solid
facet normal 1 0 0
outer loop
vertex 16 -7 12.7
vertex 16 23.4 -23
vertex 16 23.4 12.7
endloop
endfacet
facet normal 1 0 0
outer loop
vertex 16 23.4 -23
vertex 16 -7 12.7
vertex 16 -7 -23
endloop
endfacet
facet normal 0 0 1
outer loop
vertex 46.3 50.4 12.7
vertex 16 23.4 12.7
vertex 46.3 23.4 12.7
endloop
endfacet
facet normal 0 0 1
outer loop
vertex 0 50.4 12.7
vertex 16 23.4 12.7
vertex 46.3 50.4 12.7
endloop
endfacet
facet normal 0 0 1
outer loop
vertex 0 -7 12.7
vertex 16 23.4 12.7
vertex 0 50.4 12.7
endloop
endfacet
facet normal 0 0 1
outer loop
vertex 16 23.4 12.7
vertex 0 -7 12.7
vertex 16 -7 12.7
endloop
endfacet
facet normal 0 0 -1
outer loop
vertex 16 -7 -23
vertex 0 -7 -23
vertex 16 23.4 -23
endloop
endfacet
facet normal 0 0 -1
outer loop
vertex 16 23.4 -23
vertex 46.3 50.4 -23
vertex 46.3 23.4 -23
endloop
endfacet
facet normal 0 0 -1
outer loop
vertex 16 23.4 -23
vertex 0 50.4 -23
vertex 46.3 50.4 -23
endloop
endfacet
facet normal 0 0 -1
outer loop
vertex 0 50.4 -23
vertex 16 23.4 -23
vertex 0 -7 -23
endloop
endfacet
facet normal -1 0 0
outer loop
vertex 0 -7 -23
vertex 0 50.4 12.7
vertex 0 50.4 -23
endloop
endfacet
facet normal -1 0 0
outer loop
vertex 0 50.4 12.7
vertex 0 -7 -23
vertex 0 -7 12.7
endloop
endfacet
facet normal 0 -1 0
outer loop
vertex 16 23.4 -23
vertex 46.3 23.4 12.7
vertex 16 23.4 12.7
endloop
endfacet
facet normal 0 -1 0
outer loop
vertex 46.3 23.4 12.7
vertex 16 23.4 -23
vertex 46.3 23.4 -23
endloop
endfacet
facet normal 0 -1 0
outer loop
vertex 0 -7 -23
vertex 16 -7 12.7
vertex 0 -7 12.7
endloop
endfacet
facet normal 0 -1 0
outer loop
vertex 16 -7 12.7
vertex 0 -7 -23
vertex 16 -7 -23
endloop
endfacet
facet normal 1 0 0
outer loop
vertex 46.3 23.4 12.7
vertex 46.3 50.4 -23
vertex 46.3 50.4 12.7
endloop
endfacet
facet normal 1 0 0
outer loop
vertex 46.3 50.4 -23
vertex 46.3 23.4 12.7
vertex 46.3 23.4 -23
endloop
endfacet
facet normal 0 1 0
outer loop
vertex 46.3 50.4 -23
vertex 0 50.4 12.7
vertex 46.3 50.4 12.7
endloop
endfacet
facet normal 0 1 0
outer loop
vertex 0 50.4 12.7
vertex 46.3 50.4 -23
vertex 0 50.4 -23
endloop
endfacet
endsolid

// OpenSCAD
/// --- RENDER SELECTION

//air_thingy();
air_thingy_support();
//top_plate();
render_printer_connectorplate = 0;

/// --- CALIBRATION VARIABLES

heatbrake_width = 45.8 + 0.5;
heatbrake_height = 12.9 + 0.2;
heatbrake_depth = 15.8 + 0.2;
heatbrake_sunk_at_mount = 3;

fan_width = 40 + 0.2;
fan_screw_distance = 32.3;
fan_screw_diameter = 2.9;
fan_distance_from_center = 7;
fan_screw_length = 5;
fan_lip_height = 5;

board_width = 45.1;
board_height = 33;
board_solder_offset = 2.5;
board_thickness = 1.7;
board_depth = 20-board_thickness;

printhead_height = 45.1;

clampscrew_distance_from_heatbrake_end = 44.8;
clampscrew_diameter = 3 + 0.5 ;
clampscrew_distance_between = 10.5;

air_channel_width = 7;
air_channel_from_heatbrake_end = 16.4;

front_space = 20;

wall_thickness = 1.6;

nozzle_below_heatbrake = 25;
nozzle_distance_from_heatbrake_end = 61.5;
nozzle_diameter = 7;
nozzle_distance_from_heatbrake_back = 9.5;

exhaust_bed_clearance = 2;
exhaust_nozzle_clearance = 20;
exhaust_width = 5;

filament_diameter = 3.5 + 0.2;
filament_tube_diameter = 9 + 0.2;
filament_tube_guide_height = 6.5;

stepper_motor_depth = 34;
stepper_motor_width = 42.5;
stepper_motor_connector_depth = 10.3 + 0.5;
stepper_motor_connector_width = 16.3 + 0.5;

top_plate_height = 5;

/// --- CALCULATED

fan_screw_distance_from_wall = (fan_width - fan_screw_distance)/2;
fan_screw_block_size = fan_screw_diameter+fan_screw_distance_from_wall;

module top_plate() {
    difference() {
        union() {
            translate([heatbrake_width-fan_distance_from_center+wall_thickness,-wall_thickness,printhead_height])
            cube([stepper_motor_width+fan_distance_from_center-wall_thickness,heatbrake_depth+(fan_width-front_space-heatbrake_depth)+wall_thickness*3,top_plate_height]);
            
            translate([heatbrake_width-(board_width+wall_thickness*2),heatbrake_depth+(fan_width-front_space-heatbrake_depth)+wall_thickness*2,printhead_height])
            cube([stepper_motor_width+heatbrake_width+wall_thickness,stepper_motor_depth-(fan_width-heatbrake_depth-front_space+wall_thickness*2)-(board_thickness+wall_thickness*2+5),top_plate_height]);
            
            translate([heatbrake_width,heatbrake_depth,printhead_height])
            cube([stepper_motor_width,stepper_motor_depth,top_plate_height]);
            
            translate([nozzle_distance_from_heatbrake_end,heatbrake_depth-nozzle_distance_from_heatbrake_back,printhead_height+top_plate_height])
            cylinder(d=filament_tube_diameter+wall_thickness*2,h=filament_tube_guide_height,$fn=100);
        }
        
        //filament cutout
        translate([nozzle_distance_from_heatbrake_end,heatbrake_depth-nozzle_distance_from_heatbrake_back,printhead_height])
        cylinder(d=filament_diameter,h=filament_tube_guide_height+top_plate_height,$fn=100);
        
        //tube connector cutout
        translate([nozzle_distance_from_heatbrake_end,heatbrake_depth-nozzle_distance_from_heatbrake_back,printhead_height+top_plate_height])
        cylinder(d=filament_tube_diameter,h=filament_tube_guide_height,$fn=100);
        
        //board cutout
        translate([heatbrake_width-(board_width+wall_thickness)+1,heatbrake_depth+stepper_motor_depth-board_depth-wall_thickness-board_solder_offset,printhead_height-board_height/2])
        cube([board_width-2,board_depth-board_thickness,board_height]);
        
        //stepper connector cutout
        translate([heatbrake_width+((stepper_motor_width-stepper_motor_connector_width)/2),heatbrake_depth+stepper_motor_depth-stepper_motor_connector_depth,stepper_motor_width])
        cube([stepper_motor_connector_width,stepper_motor_connector_depth,10]);
        
        //clamp screw holes
        translate([clampscrew_distance_from_heatbrake_end,(heatbrake_depth-clampscrew_distance_between)/2,heatbrake_height])
        cylinder(d=clampscrew_diameter,h=printhead_height,$fn=100);
        translate([clampscrew_distance_from_heatbrake_end,(heatbrake_depth-clampscrew_distance_between)/2+clampscrew_distance_between,heatbrake_height])
        cylinder(d=clampscrew_diameter,h=printhead_height,$fn=100);
    }
}

module air_thingy_support()
{
    union() {
    translate([0,-air_channel_width,-nozzle_below_heatbrake+exhaust_bed_clearance])
    cube([air_channel_from_heatbrake_end-0.4, air_channel_width*2+heatbrake_depth+0.4, heatbrake_height - 0.4 +nozzle_below_heatbrake-exhaust_bed_clearance]);
    
    translate([0,heatbrake_depth+air_channel_width+0.4,-nozzle_below_heatbrake+exhaust_bed_clearance])
    cube([heatbrake_width, stepper_motor_depth-air_channel_width, heatbrake_height - 0.4 +nozzle_below_heatbrake-exhaust_bed_clearance]);
    }
}

module air_thingy() {
    difference() {
        union() {
            //fan lip
            translate([(heatbrake_width-fan_width-wall_thickness-fan_distance_from_center),-front_space,printhead_height+fan_screw_length])
            cube([fan_width+wall_thickness*2,fan_width+wall_thickness*2,fan_lip_height]);
            
            translate([(heatbrake_width-fan_width-wall_thickness-fan_distance_from_center),-front_space,printhead_height])
            cube([fan_width+wall_thickness*2,fan_width+wall_thickness*2,fan_screw_length]);
            
            
            //outer hull fan mount + screw block
            hull() {
                translate([(heatbrake_width-fan_width-wall_thickness-fan_distance_from_center),-front_space,printhead_height])
                cube([fan_width+wall_thickness*2,fan_width+wall_thickness*2,0.01]);
                
                translate([0,-air_channel_width,heatbrake_height])
                cube([heatbrake_width-fan_distance_from_center,heatbrake_depth+air_channel_width*2,1]);    
                
                translate([heatbrake_width-fan_distance_from_center,0,heatbrake_height])
                cube([fan_distance_from_center,heatbrake_depth,printhead_height-heatbrake_height]);
                
                //cable chamber
                translate([heatbrake_width-(board_width+wall_thickness*2),heatbrake_depth,heatbrake_height])
                cube([board_width+wall_thickness*2,stepper_motor_depth,0.01]);
                
                translate([heatbrake_width-(board_width+wall_thickness*2),heatbrake_depth,printhead_height])
                cube([board_width+wall_thickness*2,stepper_motor_depth,0.01]);
                
                //air channel start
                translate([air_channel_from_heatbrake_end,-air_channel_width,heatbrake_height])
                cube([heatbrake_width-air_channel_from_heatbrake_end,air_channel_width,0.01]);
                translate([air_channel_from_heatbrake_end,heatbrake_depth,heatbrake_height])
                cube([heatbrake_width-air_channel_from_heatbrake_end,air_channel_width,0.01]);
            }
            
            //board plate holder on top
            translate([-wall_thickness+heatbrake_width-(board_width+wall_thickness),-5-wall_thickness+heatbrake_depth+stepper_motor_depth-board_thickness-wall_thickness,printhead_height-board_height/2])
            cube([board_width+wall_thickness*2,board_thickness+wall_thickness*2+5,board_height]);
            
            translate([air_channel_from_heatbrake_end,-air_channel_width,0])
            cube([heatbrake_width-air_channel_from_heatbrake_end,air_channel_width,heatbrake_height]);
            translate([air_channel_from_heatbrake_end,heatbrake_depth,0])
            cube([heatbrake_width-air_channel_from_heatbrake_end,air_channel_width,heatbrake_height]);
            
            hull() {
                translate([air_channel_from_heatbrake_end,-air_channel_width,0])
                cube([heatbrake_width-air_channel_from_heatbrake_end,air_channel_width*2+heatbrake_depth,0.001]);
                
                translate([nozzle_distance_from_heatbrake_end-exhaust_nozzle_clearance-nozzle_diameter/2,-air_channel_width,-nozzle_below_heatbrake+exhaust_bed_clearance])
                cube([exhaust_width,air_channel_width*2+heatbrake_depth,0.001]);
            }
        }
        
        //air channel
        translate([air_channel_from_heatbrake_end+wall_thickness,-air_channel_width+wall_thickness,0])
        cube([heatbrake_width-air_channel_from_heatbrake_end-wall_thickness*2,air_channel_width-wall_thickness,heatbrake_height]);
        translate([air_channel_from_heatbrake_end+wall_thickness,heatbrake_depth,0])
        cube([heatbrake_width-air_channel_from_heatbrake_end-wall_thickness*2,air_channel_width-wall_thickness,heatbrake_height]);
        
        //lower exhaust channel
        hull() {
            translate([air_channel_from_heatbrake_end+wall_thickness,-air_channel_width+wall_thickness,0])
            cube([heatbrake_width-air_channel_from_heatbrake_end-wall_thickness*2,air_channel_width*2+heatbrake_depth-wall_thickness*2,0.001]);
            
            translate([nozzle_distance_from_heatbrake_end-exhaust_nozzle_clearance-nozzle_diameter/2+wall_thickness,-air_channel_width+wall_thickness,-nozzle_below_heatbrake+exhaust_bed_clearance])
            cube([exhaust_width-wall_thickness*2,air_channel_width*2+heatbrake_depth-wall_thickness*2,2]);
        }
        
        translate([nozzle_distance_from_heatbrake_end-exhaust_nozzle_clearance-nozzle_diameter/2+wall_thickness,-air_channel_width+wall_thickness,-nozzle_below_heatbrake+exhaust_bed_clearance])
        cube([exhaust_width,air_channel_width*2+heatbrake_depth-wall_thickness*2,2]);
    
        //air channel for fan mount
        hull() {
            translate([(heatbrake_width-fan_width-wall_thickness-fan_distance_from_center)+wall_thickness,-front_space+wall_thickness,printhead_height])
            cube([fan_width,fan_width,0.01]);
            
            translate([wall_thickness+air_channel_from_heatbrake_end,-air_channel_width+wall_thickness,heatbrake_height])
            cube([heatbrake_width-fan_distance_from_center-wall_thickness*2-air_channel_from_heatbrake_end,heatbrake_depth+air_channel_width*2-wall_thickness*2,1]);    
        }
        
        //fan lip
        translate([(heatbrake_width-fan_width-wall_thickness-fan_distance_from_center)+wall_thickness,-front_space+wall_thickness,printhead_height+fan_screw_length])
        cube([fan_width,fan_width,fan_lip_height]);
        
        //fan hole
        translate([(heatbrake_width-fan_width-wall_thickness-fan_distance_from_center)+fan_width/2+wall_thickness,-front_space+fan_width/2+wall_thickness,printhead_height])
        cylinder(d=fan_width,h=fan_screw_length,$fn=30);
        
        //fan screw holes
        translate([(heatbrake_width-fan_width-wall_thickness-fan_distance_from_center),-front_space,printhead_height])
        union() {
            translate([fan_screw_distance_from_wall+wall_thickness,fan_screw_distance_from_wall+wall_thickness,0])
            cylinder(d=fan_screw_diameter,h=fan_screw_length,$fn=10);
            
            translate([fan_screw_distance_from_wall+wall_thickness+fan_screw_distance,fan_screw_distance_from_wall+wall_thickness,0])
            cylinder(d=fan_screw_diameter,h=fan_screw_length,$fn=10);
            
            translate([fan_screw_distance_from_wall+wall_thickness,fan_screw_distance_from_wall+wall_thickness+fan_screw_distance,0])
            cylinder(d=fan_screw_diameter,h=fan_screw_length,$fn=10);
            
            translate([fan_screw_distance_from_wall+wall_thickness+fan_screw_distance,fan_screw_distance_from_wall+wall_thickness+fan_screw_distance,0])
            cylinder(d=fan_screw_diameter,h=fan_screw_length,$fn=10);
        }
            
        hull() {
            translate([heatbrake_width-(board_width+wall_thickness*2)+wall_thickness+1,fan_width-front_space+wall_thickness*2,heatbrake_height+wall_thickness])
            cube([board_width+wall_thickness*2-wall_thickness*2-2,stepper_motor_depth-fan_width+front_space+heatbrake_depth-wall_thickness*3,1]);
            
            translate([heatbrake_width-(board_width+wall_thickness*2)+wall_thickness+1,fan_width-front_space+wall_thickness*2,printhead_height])
            cube([board_width+wall_thickness*2-wall_thickness*2-2,stepper_motor_depth-fan_width+front_space+heatbrake_depth-wall_thickness*3,1]);
        }
        
        //board components
        translate([heatbrake_width-(board_width+wall_thickness)+1,heatbrake_depth+stepper_motor_depth-board_depth-wall_thickness-board_solder_offset,printhead_height-board_height/2])
        cube([board_width-2,board_depth-board_thickness,board_height]);
        
        //board plate
        translate([heatbrake_width-(board_width+wall_thickness),heatbrake_depth+stepper_motor_depth-board_thickness-wall_thickness-board_solder_offset,printhead_height-board_height/2])
        cube([board_width,board_thickness,board_height]);
        
        //board solderoffset
        translate([heatbrake_width-(board_width+wall_thickness)+1,heatbrake_depth+stepper_motor_depth-wall_thickness-board_solder_offset,printhead_height-board_height/2])
        cube([board_width-2,board_solder_offset,board_height]);
        
        //clamp screw holes
        translate([clampscrew_distance_from_heatbrake_end,(heatbrake_depth-clampscrew_distance_between)/2,heatbrake_height])
        cylinder(d=clampscrew_diameter,h=printhead_height,$fn=100);
        translate([clampscrew_distance_from_heatbrake_end,(heatbrake_depth-clampscrew_distance_between)/2+clampscrew_distance_between,heatbrake_height])
        cylinder(d=clampscrew_diameter,h=printhead_height,$fn=100);
        
        //fan cable hole
        translate([(heatbrake_width-fan_width/2-fan_distance_from_center)-2.5,-front_space+fan_width+wall_thickness,printhead_height-wall_thickness])
        cube([5,wall_thickness,fan_lip_height+wall_thickness+fan_screw_length]);
        
        //heater/thermocouple cable hole
        translate([heatbrake_width/2,heatbrake_depth+stepper_motor_depth/2,heatbrake_height])
        cylinder(d=10,h=wall_thickness,$fn=40);
    }
}

%union() {
    cube([heatbrake_width,heatbrake_depth,heatbrake_height]);
    
    translate([heatbrake_width,0,0])
    cube([stepper_motor_width,heatbrake_depth,heatbrake_height]);
    
    translate([heatbrake_width,heatbrake_depth,printhead_height-stepper_motor_width])
    cube([stepper_motor_width,stepper_motor_depth,stepper_motor_width]);
    
    //stepper connector
    translate([heatbrake_width+((stepper_motor_width-stepper_motor_connector_width)/2),heatbrake_depth+stepper_motor_depth-stepper_motor_connector_depth,stepper_motor_width])
    cube([stepper_motor_connector_width,stepper_motor_connector_depth,10]);
    
    translate([nozzle_distance_from_heatbrake_end,heatbrake_depth-nozzle_distance_from_heatbrake_back,-nozzle_below_heatbrake])
    cylinder($fn=20, d=7, h=nozzle_below_heatbrake);
    
    //board components
    translate([heatbrake_width-(board_width+wall_thickness)+1,heatbrake_depth+stepper_motor_depth-board_depth-wall_thickness-board_solder_offset,printhead_height-board_height/2])
    cube([board_width-2,board_depth-board_thickness,board_height]);
    
    //board plate
    translate([heatbrake_width-(board_width+wall_thickness),heatbrake_depth+stepper_motor_depth-board_thickness-wall_thickness-board_solder_offset,printhead_height-board_height/2])
    cube([board_width,board_thickness,board_height]);
    
    //board solderoffset
    translate([heatbrake_width-(board_width+wall_thickness)+1,heatbrake_depth+stepper_motor_depth-wall_thickness-board_solder_offset,printhead_height-board_height/2])
    cube([board_width-2,board_solder_offset,board_height]);
}
